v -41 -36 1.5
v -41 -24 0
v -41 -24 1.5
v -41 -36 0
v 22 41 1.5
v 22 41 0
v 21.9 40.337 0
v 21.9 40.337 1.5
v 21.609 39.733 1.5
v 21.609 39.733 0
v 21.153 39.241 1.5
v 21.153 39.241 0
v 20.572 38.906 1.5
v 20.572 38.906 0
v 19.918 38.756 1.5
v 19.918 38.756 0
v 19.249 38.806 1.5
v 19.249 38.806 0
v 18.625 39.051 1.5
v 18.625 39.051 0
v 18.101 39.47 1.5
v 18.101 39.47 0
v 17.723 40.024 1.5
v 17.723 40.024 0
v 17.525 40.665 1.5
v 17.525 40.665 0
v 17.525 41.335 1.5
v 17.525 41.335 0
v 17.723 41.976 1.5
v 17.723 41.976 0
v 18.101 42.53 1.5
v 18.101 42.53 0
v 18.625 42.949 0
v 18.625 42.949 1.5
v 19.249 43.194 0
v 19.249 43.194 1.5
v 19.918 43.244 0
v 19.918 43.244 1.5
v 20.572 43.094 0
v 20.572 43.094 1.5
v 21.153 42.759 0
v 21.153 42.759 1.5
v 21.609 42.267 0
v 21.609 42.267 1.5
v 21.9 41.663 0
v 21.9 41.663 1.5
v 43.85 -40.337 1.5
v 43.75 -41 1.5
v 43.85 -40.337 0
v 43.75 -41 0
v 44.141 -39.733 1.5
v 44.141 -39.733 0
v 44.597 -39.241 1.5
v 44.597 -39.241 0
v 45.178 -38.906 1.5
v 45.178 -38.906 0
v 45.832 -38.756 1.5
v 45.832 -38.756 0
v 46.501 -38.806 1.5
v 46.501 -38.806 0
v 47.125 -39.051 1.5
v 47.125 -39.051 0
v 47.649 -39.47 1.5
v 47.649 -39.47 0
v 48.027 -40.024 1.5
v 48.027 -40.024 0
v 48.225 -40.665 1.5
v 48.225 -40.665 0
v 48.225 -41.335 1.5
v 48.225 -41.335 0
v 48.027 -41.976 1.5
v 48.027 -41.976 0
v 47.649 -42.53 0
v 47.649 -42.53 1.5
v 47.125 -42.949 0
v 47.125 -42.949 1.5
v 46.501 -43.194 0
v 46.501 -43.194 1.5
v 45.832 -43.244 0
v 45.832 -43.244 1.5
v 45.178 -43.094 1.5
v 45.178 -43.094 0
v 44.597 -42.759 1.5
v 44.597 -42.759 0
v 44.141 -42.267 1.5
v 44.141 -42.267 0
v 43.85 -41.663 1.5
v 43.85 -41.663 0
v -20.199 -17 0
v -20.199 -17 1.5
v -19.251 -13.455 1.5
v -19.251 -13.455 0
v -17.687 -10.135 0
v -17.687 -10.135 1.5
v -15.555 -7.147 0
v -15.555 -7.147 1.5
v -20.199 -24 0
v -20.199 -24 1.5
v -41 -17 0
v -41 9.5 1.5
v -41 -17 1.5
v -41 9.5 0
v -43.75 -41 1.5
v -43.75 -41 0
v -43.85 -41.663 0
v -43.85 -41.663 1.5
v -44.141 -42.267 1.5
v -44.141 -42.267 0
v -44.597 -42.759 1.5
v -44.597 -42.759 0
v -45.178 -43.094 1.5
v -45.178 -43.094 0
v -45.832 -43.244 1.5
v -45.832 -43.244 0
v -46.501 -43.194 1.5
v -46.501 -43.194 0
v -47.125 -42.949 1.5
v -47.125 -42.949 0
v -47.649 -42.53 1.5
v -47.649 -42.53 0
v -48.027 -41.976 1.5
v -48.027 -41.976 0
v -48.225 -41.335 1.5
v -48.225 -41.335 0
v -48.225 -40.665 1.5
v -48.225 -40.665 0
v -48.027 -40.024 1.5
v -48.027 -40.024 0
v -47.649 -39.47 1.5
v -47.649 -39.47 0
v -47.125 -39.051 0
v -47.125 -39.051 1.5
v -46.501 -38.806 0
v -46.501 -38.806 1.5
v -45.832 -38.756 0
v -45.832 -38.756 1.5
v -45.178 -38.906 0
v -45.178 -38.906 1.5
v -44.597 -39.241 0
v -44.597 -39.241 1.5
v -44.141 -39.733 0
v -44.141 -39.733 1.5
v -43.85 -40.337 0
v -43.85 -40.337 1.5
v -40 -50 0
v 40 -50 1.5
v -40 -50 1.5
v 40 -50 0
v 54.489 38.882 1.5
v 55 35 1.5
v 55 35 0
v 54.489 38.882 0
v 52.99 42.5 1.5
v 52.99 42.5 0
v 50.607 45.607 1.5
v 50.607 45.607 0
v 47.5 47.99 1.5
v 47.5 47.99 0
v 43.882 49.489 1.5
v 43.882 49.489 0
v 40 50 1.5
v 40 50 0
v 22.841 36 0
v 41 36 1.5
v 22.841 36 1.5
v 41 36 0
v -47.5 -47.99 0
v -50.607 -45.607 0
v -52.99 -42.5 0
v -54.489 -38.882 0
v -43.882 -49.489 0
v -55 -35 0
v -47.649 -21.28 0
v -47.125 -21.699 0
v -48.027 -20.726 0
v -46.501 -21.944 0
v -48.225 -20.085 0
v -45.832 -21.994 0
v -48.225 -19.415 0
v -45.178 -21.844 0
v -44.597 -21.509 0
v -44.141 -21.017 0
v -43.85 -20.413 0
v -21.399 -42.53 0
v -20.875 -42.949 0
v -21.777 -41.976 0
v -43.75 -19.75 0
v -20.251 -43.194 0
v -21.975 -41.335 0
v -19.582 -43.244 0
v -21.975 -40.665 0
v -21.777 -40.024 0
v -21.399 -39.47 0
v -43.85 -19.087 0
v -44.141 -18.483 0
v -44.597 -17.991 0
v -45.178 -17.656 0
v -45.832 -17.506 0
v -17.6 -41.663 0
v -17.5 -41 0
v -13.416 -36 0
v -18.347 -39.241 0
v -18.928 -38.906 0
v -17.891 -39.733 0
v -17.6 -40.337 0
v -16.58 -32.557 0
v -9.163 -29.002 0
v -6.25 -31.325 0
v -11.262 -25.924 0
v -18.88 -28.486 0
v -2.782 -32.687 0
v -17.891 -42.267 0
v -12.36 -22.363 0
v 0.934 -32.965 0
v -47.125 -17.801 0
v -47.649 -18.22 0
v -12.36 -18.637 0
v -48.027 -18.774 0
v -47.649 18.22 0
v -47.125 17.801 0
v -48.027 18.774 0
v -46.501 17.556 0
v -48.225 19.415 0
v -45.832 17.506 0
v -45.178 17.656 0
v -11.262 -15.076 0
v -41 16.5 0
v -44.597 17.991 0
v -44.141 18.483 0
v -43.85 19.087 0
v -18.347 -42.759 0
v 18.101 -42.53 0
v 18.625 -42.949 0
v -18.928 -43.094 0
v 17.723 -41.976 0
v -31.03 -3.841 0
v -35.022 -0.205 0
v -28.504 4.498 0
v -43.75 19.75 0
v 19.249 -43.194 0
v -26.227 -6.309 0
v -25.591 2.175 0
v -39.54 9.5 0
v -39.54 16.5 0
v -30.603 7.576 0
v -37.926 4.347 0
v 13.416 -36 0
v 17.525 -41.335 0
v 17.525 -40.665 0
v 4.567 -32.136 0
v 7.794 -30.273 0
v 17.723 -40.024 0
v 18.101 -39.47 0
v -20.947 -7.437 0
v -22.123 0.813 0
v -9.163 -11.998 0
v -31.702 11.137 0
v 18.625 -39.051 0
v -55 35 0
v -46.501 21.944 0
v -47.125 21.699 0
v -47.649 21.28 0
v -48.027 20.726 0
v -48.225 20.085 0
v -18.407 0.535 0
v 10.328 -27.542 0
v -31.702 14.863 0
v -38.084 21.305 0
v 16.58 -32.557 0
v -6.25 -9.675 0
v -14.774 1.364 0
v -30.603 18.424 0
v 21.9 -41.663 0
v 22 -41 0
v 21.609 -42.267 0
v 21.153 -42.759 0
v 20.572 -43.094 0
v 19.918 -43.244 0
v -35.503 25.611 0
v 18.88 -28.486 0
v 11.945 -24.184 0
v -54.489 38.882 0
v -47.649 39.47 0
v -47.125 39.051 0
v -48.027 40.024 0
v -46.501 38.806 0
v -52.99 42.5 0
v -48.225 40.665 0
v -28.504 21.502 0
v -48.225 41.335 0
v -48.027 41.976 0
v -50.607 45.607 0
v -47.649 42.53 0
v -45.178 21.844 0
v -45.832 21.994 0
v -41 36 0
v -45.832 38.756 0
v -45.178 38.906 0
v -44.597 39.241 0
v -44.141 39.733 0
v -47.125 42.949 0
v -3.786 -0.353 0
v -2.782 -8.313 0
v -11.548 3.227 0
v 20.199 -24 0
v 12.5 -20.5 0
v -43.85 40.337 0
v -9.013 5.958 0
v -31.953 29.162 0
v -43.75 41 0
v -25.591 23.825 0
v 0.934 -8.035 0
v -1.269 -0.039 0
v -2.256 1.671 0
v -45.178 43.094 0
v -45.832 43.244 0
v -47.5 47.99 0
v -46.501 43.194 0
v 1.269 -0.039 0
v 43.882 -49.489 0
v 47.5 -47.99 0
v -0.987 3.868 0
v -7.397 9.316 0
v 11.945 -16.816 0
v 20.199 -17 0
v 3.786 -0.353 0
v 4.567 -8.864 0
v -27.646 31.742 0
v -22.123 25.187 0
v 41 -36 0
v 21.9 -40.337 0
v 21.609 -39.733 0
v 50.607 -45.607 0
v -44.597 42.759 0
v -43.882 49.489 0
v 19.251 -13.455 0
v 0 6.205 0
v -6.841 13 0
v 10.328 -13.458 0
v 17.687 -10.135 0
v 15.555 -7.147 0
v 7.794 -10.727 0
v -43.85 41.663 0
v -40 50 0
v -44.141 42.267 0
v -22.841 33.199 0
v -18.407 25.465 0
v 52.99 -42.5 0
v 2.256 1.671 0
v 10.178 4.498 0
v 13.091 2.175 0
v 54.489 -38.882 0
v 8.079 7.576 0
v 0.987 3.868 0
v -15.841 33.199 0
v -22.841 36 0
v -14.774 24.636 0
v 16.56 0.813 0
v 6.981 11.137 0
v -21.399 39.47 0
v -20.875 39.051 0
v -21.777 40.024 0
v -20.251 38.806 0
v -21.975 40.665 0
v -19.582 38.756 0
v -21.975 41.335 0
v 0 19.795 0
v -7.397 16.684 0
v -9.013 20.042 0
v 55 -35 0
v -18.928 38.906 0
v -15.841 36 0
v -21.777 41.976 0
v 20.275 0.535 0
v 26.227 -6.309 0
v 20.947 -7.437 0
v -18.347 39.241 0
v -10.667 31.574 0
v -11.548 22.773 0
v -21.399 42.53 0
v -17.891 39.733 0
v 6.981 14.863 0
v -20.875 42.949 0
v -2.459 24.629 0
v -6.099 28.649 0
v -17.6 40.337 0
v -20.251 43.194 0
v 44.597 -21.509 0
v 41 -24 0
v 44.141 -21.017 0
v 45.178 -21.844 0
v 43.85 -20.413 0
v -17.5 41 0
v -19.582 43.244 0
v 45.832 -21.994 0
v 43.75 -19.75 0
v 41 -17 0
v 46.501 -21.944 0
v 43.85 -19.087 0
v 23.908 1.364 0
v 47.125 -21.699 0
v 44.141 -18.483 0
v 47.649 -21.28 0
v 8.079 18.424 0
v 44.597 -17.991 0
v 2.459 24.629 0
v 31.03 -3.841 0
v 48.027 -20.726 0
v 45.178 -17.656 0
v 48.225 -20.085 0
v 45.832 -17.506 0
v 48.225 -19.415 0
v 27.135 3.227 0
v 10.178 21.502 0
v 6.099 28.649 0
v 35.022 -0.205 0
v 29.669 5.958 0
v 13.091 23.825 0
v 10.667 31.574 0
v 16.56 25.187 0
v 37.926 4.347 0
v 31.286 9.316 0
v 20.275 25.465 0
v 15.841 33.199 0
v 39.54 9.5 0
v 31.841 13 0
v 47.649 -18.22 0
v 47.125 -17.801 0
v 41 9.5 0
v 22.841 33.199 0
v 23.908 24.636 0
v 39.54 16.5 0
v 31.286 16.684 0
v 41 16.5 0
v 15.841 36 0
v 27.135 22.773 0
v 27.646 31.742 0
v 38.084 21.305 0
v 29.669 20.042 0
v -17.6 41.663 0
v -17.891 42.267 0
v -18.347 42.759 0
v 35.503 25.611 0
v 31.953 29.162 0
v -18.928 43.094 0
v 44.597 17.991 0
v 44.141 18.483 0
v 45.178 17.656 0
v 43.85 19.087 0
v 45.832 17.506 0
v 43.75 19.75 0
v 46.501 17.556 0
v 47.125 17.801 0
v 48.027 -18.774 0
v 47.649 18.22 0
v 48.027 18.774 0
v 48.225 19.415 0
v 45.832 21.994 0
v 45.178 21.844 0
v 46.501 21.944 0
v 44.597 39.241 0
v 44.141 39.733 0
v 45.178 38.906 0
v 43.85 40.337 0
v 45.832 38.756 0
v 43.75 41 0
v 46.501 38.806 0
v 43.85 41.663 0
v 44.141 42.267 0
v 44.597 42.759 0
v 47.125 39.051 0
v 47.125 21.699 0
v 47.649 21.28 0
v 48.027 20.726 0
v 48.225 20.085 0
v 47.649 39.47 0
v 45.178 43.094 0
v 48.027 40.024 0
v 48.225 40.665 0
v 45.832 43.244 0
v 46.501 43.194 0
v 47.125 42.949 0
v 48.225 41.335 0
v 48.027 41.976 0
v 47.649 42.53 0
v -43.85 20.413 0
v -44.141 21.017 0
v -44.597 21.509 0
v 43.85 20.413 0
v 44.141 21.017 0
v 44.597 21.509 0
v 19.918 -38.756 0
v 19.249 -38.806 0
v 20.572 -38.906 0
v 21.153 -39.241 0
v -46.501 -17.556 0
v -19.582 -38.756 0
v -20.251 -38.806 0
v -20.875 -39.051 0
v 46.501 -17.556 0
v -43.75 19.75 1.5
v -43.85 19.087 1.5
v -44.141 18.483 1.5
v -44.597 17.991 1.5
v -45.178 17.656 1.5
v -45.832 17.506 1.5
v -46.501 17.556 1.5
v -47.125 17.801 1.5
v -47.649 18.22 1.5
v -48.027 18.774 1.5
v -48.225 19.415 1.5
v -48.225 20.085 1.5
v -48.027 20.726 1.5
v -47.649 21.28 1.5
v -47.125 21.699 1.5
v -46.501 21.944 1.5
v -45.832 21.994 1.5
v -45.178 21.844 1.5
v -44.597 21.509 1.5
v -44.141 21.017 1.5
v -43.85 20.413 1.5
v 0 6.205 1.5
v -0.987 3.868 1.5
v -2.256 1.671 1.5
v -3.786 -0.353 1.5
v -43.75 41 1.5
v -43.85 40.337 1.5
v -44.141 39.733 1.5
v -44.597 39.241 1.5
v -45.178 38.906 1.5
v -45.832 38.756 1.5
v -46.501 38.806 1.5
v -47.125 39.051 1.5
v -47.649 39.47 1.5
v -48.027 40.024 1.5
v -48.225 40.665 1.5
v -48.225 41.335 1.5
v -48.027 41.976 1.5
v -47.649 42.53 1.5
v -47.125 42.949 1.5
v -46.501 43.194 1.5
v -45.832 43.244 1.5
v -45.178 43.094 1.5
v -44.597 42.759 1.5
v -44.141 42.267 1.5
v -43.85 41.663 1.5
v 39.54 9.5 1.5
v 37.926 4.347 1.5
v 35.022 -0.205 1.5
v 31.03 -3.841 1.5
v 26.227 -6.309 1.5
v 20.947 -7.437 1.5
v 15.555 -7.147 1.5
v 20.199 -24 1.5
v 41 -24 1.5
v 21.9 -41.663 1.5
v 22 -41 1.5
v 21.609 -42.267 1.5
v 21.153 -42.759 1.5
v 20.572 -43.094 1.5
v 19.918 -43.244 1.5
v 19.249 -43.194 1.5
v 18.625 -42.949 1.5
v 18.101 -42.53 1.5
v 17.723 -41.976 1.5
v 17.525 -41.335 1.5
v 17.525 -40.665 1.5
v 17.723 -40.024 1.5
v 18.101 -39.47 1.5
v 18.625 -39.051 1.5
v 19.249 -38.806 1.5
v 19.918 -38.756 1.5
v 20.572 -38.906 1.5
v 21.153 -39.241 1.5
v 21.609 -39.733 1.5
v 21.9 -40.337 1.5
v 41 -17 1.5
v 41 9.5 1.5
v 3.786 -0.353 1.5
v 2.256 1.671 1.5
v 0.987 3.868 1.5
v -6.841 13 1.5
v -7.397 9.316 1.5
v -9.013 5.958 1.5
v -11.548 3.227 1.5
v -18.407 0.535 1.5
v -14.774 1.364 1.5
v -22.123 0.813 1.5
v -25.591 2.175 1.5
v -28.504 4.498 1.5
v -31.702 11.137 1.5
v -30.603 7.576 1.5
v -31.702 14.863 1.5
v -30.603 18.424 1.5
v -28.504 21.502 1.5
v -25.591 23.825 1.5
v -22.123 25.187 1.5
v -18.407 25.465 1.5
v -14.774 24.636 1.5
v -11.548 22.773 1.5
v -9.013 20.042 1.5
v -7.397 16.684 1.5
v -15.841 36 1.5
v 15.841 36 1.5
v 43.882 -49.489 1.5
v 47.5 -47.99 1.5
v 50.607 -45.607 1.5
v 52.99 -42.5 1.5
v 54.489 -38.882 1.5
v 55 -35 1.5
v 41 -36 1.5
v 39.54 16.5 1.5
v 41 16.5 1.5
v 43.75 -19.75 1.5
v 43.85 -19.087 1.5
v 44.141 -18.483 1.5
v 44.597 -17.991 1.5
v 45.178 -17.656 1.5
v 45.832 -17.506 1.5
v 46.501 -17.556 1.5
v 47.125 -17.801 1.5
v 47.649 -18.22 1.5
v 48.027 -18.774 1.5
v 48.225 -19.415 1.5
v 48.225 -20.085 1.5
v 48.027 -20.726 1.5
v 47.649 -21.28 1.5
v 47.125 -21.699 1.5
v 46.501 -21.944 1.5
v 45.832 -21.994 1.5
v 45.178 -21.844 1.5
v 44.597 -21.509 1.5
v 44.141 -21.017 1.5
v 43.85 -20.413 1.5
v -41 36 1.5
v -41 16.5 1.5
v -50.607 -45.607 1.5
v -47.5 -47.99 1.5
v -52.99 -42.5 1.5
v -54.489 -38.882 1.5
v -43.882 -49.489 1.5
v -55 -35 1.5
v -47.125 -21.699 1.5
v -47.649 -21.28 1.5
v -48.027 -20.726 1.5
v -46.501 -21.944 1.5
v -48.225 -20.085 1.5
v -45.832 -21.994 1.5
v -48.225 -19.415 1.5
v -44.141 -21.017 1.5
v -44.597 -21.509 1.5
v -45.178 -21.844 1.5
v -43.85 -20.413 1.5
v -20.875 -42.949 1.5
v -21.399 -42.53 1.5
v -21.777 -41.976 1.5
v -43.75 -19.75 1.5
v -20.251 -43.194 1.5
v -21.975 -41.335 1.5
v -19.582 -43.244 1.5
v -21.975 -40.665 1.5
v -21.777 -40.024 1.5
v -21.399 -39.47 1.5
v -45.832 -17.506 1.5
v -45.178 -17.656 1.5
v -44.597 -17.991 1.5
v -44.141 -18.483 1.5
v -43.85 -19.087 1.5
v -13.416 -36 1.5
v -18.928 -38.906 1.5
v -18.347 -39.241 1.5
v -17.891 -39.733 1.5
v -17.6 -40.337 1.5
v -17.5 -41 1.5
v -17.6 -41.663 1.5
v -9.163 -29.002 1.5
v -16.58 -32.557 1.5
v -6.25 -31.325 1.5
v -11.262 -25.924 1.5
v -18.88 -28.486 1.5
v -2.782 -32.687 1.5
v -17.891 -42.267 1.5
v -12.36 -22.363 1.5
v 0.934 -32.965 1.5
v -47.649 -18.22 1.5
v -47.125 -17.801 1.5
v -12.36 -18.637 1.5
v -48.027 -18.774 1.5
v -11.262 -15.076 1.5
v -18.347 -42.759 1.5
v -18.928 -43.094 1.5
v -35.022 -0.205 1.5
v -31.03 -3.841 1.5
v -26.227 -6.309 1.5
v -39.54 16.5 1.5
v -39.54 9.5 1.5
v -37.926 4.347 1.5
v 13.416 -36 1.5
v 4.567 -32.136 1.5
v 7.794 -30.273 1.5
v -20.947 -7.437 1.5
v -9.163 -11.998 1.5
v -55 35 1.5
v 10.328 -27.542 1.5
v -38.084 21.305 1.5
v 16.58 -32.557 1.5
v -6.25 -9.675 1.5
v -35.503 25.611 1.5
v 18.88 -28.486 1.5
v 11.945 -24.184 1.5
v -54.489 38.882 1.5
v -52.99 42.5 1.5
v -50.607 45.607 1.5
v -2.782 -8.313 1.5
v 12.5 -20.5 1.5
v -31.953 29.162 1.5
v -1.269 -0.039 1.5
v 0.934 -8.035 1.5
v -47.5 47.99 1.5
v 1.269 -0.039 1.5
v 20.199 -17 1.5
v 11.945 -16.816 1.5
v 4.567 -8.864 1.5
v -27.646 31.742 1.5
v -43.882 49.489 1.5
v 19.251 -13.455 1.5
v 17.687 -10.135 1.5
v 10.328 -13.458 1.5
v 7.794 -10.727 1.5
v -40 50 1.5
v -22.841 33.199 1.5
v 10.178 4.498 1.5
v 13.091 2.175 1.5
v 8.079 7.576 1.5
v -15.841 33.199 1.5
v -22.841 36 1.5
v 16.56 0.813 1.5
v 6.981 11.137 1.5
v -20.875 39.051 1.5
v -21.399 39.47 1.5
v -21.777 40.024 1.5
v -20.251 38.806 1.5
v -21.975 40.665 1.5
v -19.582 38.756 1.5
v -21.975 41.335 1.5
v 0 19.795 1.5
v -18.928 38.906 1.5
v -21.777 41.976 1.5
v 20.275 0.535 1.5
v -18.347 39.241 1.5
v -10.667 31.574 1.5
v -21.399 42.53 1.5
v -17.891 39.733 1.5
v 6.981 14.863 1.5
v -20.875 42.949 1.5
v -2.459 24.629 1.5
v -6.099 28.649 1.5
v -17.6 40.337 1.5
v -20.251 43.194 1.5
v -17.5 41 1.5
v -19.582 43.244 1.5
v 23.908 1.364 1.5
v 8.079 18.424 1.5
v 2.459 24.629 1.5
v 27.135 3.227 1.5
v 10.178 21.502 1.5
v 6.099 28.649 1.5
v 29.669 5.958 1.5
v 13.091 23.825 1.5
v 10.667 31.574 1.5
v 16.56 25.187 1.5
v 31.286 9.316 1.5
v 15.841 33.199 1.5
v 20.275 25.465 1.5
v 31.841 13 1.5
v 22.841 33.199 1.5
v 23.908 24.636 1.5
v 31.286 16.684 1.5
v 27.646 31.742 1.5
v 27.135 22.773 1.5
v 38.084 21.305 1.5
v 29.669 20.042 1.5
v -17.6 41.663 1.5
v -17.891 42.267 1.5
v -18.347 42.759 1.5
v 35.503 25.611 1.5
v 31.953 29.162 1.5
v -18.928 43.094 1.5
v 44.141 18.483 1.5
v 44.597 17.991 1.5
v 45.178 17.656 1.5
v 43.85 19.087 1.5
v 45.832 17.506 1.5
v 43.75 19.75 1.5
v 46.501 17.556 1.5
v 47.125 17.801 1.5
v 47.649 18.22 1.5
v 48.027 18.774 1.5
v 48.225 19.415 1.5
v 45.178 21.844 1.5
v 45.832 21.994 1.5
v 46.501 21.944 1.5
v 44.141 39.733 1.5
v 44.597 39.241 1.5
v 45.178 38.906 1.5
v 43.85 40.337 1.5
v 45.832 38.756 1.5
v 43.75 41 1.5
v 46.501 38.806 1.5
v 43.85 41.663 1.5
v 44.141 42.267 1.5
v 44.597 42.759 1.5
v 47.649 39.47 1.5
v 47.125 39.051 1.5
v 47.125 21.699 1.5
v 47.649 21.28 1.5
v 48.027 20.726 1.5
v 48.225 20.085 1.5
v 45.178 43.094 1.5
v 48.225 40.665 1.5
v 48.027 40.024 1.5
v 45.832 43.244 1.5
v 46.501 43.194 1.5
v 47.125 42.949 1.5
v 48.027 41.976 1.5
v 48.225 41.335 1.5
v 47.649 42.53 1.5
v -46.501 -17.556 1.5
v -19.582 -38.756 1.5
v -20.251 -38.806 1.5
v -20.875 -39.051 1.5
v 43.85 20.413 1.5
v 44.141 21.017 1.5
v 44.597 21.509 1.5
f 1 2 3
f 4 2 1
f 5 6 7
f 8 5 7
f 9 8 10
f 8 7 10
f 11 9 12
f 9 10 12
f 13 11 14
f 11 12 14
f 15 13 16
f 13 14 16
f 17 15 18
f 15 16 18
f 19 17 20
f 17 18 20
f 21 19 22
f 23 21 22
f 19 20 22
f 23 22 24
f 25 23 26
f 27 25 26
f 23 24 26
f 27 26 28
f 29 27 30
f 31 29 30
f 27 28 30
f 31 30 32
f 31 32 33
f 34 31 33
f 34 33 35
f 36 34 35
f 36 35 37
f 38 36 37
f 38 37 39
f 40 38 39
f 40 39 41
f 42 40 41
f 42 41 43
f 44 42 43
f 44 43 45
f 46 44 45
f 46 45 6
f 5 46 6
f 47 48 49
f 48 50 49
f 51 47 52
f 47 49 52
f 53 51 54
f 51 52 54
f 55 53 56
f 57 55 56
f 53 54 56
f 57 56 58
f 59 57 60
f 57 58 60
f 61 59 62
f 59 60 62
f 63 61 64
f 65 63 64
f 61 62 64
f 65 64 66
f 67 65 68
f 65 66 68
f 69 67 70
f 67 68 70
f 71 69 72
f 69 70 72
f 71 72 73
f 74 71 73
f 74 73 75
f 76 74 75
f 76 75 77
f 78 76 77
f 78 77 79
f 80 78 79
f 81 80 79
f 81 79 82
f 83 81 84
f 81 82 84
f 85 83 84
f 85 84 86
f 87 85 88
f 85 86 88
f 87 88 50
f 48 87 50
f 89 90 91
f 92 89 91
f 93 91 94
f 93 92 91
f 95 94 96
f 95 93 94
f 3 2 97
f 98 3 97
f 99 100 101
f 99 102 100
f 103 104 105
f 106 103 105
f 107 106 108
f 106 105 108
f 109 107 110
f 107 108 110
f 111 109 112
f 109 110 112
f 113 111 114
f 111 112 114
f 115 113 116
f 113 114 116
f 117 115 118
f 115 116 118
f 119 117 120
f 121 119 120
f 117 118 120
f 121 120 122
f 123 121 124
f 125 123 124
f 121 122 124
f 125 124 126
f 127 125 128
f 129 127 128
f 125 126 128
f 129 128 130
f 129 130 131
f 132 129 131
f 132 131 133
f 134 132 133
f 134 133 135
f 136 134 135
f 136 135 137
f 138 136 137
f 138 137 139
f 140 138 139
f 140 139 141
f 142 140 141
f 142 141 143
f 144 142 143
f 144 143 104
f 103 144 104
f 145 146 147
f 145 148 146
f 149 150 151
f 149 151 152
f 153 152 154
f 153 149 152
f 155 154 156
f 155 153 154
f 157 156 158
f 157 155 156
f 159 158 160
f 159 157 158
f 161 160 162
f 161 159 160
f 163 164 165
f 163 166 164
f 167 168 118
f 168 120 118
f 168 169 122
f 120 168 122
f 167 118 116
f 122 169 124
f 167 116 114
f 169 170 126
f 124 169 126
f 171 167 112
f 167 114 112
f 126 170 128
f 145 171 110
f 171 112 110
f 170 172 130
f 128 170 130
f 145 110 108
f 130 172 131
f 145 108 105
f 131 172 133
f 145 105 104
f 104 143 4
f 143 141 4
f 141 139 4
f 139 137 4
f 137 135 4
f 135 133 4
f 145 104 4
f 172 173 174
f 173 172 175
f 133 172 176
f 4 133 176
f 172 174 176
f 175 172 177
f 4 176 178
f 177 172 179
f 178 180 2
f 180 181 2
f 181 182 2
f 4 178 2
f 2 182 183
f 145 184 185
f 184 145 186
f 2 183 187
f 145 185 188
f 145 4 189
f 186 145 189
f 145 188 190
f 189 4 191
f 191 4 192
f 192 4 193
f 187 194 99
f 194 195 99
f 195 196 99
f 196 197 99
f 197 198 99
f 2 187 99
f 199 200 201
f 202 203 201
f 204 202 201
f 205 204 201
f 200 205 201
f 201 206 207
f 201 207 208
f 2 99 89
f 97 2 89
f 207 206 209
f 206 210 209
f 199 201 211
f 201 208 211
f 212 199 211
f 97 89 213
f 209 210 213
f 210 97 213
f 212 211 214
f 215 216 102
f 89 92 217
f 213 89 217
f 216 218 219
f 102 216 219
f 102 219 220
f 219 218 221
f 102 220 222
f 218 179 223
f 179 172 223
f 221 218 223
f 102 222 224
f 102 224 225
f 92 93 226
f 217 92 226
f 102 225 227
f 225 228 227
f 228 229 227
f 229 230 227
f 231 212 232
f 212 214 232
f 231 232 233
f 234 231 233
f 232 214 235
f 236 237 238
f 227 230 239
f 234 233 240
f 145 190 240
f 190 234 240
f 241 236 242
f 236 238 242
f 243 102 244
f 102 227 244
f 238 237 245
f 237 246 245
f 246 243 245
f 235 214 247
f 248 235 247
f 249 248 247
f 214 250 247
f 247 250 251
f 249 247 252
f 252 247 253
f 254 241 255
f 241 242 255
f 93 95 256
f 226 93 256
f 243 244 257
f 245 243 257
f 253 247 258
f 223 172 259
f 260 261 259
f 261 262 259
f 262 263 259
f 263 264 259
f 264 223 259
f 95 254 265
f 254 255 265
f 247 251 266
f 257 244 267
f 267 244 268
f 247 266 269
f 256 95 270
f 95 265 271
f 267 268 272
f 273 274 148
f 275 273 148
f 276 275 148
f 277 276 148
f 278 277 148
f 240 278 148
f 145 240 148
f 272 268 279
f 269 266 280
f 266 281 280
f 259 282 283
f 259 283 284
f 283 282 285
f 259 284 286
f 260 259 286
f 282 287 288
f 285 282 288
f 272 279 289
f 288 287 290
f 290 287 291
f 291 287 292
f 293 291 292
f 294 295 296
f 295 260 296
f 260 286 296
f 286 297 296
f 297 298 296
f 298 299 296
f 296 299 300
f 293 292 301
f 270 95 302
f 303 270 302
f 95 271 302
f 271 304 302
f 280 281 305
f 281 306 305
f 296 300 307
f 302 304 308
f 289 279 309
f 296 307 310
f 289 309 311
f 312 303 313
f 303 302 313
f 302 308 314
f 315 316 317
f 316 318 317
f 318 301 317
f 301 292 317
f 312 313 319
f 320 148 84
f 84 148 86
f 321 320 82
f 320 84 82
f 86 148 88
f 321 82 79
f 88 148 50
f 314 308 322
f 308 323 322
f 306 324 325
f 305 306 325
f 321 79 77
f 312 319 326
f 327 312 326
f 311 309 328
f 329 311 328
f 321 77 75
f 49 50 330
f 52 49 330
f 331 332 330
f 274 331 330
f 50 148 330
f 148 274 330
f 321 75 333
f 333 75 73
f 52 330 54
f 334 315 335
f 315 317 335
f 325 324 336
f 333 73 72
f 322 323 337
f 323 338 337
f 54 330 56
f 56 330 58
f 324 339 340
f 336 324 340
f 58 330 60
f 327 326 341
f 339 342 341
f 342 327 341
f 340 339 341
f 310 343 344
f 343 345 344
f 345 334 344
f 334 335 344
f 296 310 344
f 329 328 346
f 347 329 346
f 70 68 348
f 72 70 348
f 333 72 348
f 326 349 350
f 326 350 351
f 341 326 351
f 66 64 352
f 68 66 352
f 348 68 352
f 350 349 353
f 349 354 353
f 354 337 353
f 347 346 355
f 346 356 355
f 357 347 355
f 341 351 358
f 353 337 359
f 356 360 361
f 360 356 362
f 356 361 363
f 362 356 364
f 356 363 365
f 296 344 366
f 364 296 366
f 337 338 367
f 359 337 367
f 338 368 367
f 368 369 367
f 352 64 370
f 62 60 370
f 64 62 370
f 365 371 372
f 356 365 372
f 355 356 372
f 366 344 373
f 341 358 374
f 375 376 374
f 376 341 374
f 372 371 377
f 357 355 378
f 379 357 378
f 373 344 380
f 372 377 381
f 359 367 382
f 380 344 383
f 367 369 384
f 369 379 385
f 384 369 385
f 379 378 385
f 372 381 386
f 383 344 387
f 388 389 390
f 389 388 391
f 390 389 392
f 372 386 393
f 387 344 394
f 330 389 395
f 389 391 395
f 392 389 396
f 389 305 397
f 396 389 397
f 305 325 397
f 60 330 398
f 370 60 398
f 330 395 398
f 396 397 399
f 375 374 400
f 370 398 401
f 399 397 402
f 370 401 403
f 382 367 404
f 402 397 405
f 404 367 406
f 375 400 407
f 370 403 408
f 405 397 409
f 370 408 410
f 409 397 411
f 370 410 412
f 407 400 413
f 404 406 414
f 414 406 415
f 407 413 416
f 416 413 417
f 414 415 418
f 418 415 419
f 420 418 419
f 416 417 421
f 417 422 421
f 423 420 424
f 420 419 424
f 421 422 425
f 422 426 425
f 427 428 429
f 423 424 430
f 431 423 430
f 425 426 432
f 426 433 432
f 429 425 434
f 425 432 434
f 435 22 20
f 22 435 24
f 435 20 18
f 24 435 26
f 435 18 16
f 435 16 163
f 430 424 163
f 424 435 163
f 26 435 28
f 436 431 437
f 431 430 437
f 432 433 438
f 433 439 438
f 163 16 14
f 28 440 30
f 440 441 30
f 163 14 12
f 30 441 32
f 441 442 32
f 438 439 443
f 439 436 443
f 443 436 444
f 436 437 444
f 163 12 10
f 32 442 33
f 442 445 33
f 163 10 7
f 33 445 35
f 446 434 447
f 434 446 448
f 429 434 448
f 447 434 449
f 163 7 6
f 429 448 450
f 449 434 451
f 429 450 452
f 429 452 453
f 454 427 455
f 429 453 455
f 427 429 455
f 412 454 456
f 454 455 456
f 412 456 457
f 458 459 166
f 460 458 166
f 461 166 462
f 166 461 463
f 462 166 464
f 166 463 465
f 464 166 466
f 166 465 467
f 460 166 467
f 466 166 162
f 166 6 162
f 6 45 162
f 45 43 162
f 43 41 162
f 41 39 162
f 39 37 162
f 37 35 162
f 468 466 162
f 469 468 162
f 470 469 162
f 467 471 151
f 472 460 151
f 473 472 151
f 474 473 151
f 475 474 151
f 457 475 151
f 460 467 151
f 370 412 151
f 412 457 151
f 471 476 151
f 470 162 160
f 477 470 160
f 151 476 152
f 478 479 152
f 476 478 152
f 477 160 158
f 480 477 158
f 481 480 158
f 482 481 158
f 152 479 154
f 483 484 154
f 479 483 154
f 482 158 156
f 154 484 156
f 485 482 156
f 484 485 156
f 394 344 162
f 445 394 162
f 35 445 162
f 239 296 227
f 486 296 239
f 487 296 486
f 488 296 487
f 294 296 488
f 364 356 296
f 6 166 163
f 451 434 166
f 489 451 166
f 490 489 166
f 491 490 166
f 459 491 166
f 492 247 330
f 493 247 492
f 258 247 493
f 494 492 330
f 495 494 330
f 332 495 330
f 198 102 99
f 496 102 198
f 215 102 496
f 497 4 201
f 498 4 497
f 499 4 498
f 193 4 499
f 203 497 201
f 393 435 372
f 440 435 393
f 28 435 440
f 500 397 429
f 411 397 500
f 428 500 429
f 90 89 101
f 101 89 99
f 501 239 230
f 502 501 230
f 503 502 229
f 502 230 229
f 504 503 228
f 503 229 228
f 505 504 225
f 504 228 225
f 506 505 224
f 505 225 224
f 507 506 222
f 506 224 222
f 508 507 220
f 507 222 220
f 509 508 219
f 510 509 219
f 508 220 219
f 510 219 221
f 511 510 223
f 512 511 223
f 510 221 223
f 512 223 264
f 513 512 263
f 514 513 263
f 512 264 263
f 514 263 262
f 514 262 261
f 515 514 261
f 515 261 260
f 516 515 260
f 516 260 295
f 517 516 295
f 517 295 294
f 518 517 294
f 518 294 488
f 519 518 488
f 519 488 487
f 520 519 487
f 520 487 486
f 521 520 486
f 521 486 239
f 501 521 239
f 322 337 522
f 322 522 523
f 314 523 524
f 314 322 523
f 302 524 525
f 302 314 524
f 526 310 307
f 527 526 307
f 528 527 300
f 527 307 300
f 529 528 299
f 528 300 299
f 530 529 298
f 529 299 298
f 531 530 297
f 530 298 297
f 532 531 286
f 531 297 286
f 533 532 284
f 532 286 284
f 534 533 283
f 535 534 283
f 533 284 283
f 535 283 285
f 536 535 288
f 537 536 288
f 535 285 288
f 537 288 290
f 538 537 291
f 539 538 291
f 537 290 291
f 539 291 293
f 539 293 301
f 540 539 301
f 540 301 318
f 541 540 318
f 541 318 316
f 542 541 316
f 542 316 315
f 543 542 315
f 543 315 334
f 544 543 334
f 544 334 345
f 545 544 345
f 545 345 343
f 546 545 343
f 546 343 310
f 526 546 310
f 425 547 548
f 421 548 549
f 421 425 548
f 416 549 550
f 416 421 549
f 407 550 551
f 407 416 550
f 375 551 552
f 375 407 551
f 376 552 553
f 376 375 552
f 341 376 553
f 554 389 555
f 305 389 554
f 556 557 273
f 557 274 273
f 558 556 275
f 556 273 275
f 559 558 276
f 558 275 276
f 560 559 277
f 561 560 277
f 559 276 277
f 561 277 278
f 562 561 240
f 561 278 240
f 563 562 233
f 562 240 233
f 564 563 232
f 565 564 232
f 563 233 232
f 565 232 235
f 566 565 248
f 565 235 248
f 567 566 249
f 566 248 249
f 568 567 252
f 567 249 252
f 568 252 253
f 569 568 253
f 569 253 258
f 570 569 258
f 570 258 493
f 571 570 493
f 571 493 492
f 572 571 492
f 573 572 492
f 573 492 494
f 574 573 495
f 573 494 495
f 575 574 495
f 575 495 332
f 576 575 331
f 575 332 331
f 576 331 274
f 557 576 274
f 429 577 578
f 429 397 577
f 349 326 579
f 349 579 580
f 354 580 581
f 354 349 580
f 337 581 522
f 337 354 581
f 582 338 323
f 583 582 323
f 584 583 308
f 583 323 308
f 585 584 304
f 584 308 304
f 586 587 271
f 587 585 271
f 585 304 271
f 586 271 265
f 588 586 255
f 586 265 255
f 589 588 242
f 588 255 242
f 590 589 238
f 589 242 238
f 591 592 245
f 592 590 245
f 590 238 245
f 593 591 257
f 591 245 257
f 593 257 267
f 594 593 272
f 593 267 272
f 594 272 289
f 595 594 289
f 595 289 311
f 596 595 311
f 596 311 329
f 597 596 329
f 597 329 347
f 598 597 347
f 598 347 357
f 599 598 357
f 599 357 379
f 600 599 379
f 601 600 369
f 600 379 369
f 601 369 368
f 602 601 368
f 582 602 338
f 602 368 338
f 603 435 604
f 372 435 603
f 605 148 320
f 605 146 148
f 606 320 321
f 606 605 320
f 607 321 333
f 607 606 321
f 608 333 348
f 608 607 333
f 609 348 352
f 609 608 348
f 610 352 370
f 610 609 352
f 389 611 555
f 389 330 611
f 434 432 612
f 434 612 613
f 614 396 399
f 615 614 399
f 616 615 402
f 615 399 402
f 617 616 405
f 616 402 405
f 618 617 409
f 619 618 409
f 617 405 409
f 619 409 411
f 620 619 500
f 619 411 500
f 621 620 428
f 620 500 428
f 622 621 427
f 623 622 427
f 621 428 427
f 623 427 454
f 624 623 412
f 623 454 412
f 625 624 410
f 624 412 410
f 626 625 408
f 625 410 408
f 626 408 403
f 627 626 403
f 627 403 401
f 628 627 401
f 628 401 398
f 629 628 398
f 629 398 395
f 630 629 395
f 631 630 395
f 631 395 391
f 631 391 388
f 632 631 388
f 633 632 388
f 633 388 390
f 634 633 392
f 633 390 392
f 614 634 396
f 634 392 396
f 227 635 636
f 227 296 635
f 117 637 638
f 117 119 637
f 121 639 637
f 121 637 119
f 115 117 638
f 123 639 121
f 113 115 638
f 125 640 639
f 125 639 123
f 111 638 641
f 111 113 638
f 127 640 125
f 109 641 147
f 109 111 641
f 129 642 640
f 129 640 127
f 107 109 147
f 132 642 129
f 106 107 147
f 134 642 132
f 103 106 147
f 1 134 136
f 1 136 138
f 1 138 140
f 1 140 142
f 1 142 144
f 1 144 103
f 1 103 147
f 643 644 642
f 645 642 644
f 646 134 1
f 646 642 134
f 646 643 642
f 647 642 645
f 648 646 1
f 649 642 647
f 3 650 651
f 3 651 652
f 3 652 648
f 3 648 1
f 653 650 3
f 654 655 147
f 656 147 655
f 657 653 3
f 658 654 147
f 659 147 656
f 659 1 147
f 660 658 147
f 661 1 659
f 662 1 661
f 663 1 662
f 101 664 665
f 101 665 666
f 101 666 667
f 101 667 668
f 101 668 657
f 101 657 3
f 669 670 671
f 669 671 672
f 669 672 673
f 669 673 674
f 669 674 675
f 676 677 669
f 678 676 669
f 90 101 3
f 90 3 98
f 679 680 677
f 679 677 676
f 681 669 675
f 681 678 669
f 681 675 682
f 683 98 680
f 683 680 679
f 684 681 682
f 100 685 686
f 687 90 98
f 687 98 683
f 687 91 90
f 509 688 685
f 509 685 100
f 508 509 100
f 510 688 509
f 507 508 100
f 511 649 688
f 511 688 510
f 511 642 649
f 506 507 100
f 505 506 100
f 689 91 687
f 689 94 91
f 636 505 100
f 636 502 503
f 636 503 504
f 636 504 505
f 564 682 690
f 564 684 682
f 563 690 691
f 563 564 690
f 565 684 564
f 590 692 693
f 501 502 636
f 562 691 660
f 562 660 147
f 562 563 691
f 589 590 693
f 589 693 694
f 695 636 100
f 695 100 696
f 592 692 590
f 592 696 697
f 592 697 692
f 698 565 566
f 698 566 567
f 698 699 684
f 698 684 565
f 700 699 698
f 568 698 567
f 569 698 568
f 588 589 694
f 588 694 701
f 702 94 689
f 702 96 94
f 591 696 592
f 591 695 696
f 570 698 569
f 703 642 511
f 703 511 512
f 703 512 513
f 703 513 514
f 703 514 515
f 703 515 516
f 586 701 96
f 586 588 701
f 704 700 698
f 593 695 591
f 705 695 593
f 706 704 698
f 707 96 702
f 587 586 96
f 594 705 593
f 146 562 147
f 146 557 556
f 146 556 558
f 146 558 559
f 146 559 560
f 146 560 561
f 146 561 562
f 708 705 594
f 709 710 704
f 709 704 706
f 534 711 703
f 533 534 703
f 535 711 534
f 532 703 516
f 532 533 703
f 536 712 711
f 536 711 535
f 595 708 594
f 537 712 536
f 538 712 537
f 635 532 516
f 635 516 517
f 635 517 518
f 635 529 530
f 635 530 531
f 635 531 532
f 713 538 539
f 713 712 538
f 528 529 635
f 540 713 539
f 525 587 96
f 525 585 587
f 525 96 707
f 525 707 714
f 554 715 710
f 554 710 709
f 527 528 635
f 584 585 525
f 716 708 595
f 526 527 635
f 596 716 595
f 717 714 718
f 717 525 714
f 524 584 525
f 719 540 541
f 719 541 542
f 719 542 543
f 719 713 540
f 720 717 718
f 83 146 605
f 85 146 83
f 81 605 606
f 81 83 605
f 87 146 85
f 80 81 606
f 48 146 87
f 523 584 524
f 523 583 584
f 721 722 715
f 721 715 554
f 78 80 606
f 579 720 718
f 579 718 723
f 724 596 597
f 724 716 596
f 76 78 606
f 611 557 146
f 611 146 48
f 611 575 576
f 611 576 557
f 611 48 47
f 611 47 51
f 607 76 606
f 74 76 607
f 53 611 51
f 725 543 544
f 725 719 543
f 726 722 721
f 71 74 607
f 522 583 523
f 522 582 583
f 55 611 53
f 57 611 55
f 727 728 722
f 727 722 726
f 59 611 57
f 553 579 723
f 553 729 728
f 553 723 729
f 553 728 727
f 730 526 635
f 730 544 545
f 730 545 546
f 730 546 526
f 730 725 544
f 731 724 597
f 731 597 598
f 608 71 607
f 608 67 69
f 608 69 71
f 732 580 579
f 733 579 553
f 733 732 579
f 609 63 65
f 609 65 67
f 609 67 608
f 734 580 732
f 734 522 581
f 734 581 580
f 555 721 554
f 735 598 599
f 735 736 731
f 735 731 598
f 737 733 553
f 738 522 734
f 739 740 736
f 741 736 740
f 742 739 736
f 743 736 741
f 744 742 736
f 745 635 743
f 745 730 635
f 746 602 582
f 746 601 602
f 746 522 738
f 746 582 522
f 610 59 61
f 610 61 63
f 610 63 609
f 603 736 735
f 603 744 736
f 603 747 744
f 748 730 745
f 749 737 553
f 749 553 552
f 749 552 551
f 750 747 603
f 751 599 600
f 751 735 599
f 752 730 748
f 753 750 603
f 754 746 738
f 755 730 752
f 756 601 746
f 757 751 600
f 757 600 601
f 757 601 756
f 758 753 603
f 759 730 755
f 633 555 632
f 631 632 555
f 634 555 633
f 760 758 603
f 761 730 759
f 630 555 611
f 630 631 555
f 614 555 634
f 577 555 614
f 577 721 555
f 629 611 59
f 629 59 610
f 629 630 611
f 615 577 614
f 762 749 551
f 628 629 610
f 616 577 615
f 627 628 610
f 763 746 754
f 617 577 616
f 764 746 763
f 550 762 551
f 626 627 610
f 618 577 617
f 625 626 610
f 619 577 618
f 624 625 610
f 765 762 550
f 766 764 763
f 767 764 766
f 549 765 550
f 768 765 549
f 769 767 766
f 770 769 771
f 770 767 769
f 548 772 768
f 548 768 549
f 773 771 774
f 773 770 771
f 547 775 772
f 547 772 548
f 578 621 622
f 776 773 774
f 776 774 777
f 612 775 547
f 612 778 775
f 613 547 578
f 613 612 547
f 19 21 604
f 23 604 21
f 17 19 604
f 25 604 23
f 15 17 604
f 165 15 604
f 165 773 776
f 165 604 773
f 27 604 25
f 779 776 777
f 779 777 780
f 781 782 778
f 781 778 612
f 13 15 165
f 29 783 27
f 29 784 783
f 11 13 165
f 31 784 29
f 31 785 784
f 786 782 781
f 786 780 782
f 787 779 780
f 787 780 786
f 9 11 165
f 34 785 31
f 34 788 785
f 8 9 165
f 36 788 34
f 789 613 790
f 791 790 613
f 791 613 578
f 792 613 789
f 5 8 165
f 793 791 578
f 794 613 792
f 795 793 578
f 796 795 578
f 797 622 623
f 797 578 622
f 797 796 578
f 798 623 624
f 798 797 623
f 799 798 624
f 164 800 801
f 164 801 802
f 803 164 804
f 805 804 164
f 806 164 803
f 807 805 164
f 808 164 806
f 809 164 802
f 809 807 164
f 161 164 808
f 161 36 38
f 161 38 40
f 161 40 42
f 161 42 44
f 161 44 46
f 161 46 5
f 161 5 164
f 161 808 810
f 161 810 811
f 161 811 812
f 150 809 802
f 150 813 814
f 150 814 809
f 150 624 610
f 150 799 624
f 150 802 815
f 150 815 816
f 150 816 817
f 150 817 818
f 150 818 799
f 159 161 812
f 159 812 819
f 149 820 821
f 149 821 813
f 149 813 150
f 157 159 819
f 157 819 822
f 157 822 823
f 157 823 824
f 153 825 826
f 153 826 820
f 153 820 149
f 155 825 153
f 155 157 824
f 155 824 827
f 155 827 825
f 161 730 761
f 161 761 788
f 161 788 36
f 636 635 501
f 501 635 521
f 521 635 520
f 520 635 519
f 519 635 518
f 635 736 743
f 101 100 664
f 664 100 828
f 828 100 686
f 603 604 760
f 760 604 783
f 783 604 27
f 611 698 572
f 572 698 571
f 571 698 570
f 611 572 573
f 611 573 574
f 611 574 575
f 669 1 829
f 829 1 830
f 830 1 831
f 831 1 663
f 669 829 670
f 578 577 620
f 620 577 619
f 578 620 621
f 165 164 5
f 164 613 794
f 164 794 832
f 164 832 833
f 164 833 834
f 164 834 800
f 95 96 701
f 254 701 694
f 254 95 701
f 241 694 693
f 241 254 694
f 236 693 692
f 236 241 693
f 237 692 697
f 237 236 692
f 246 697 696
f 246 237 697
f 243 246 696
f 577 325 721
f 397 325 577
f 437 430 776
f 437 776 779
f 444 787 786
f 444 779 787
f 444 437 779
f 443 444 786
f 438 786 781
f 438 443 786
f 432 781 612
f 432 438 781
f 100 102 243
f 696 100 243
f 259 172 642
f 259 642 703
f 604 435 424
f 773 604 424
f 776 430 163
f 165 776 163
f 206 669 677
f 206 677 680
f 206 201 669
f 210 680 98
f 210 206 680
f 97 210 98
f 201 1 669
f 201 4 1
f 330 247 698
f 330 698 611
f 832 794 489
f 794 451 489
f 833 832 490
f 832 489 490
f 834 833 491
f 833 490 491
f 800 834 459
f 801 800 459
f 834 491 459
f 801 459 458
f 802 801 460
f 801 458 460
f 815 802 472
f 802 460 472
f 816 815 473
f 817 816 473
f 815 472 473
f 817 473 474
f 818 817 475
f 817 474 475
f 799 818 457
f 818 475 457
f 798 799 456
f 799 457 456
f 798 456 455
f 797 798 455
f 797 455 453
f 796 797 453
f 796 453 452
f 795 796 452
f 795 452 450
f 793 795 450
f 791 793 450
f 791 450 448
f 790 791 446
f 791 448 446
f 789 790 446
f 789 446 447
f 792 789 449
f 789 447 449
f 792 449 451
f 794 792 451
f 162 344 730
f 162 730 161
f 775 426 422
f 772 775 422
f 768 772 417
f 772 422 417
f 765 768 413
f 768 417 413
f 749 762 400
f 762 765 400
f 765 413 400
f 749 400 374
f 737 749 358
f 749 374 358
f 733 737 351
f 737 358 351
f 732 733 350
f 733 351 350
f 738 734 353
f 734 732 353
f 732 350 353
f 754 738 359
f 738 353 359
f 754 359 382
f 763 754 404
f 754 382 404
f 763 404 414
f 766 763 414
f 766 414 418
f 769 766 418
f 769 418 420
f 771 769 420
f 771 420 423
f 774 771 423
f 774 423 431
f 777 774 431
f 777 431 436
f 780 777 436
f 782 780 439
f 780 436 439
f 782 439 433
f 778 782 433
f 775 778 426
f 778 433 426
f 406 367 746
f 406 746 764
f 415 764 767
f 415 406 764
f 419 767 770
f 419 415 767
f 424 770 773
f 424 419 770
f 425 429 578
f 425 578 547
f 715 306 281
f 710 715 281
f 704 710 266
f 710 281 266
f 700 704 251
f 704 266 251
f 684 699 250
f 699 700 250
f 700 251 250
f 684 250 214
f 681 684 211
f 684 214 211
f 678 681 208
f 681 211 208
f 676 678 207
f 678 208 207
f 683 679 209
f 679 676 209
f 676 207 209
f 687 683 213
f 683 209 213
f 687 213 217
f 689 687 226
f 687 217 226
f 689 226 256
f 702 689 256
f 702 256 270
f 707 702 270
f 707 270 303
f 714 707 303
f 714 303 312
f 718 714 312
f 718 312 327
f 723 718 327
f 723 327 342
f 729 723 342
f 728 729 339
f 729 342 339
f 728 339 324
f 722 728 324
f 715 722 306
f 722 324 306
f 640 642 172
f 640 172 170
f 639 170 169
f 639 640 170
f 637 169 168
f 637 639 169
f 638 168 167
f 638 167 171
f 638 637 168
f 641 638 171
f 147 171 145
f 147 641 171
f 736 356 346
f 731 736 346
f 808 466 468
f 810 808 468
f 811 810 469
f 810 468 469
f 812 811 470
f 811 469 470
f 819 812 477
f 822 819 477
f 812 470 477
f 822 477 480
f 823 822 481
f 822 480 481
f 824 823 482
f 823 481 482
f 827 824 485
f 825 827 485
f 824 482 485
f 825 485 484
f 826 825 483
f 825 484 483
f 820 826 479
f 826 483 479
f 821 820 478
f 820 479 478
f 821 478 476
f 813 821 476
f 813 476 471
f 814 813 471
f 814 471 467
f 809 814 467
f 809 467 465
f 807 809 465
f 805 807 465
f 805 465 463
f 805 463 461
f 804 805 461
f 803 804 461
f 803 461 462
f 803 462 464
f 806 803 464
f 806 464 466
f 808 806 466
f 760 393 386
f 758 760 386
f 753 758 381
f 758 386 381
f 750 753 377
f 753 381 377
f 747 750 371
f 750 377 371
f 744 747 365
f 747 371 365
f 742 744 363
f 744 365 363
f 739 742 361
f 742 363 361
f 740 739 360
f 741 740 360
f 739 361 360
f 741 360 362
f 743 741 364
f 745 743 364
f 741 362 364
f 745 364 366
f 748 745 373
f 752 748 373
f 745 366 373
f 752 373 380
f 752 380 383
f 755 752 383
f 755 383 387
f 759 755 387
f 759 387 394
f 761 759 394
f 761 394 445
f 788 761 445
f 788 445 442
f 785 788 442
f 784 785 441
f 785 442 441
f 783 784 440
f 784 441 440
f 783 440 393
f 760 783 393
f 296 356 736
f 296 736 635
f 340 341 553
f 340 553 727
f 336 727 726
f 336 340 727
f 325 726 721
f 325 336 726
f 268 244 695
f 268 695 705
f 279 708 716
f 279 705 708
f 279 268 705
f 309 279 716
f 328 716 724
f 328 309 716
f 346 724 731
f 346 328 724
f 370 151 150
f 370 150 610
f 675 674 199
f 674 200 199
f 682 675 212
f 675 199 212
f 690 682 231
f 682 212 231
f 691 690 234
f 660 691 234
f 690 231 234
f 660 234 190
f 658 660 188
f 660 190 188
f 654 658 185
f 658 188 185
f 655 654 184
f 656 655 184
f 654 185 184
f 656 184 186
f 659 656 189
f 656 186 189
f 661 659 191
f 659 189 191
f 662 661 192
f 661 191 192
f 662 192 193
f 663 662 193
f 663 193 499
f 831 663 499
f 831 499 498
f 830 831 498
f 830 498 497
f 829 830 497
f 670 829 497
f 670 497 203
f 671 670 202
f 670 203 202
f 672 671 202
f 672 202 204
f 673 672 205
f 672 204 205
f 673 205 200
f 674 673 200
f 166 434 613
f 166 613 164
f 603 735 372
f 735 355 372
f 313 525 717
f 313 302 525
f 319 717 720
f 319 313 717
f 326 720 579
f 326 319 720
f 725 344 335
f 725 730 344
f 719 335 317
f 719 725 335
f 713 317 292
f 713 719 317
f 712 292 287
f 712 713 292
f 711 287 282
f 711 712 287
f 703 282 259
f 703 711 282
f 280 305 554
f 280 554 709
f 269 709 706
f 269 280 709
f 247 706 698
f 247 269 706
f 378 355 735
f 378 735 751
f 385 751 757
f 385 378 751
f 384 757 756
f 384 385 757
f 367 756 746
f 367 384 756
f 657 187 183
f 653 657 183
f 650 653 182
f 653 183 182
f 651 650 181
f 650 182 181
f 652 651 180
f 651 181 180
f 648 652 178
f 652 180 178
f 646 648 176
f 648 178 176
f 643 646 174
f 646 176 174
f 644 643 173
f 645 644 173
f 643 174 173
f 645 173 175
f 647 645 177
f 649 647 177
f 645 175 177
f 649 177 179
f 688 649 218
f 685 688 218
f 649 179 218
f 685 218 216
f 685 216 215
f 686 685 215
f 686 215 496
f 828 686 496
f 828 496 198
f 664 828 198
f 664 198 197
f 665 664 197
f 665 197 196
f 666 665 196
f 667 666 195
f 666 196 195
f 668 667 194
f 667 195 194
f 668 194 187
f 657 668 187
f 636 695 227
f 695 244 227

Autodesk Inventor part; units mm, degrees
ref_plane "YZ Plane" through (0, 0, 0) normal (1, 0, 0) x (0, 1, 0)
ref_plane "XZ Plane" through (0, 0, 0) normal (0, 1, 0) x (-1, 0, 0)
ref_plane "XY Plane" through (0, 0, 0) normal (0, 0, 1) x (1, 0, 0)
sketch "Sketch1" plane through (0, 0, 0) normal (0, 0, 1) x (1, 0, 0)
  line L0 (-55, 50) -> (55, 50)
  line L1 (55, 50) -> (55, -50)
  line L2 (55, -50) -> (-55, -50)
  line L3 (-55, -50) -> (-55, 50)
  line L4 (41, 36) -> (-41, 36)
  line L5 (-41, 36) -> (-41, -36)
  line L6 (-41, -36) -> (41, -36)
  line L7 (41, -36) -> (41, 36)
  line L8 (0, 152.7233) -> (0, -72.1628) construction
  line L9 (-77.8847, 0) -> (88.8171, 0) construction
  line L10 (-55, 41) -> (55, 41) construction
  circle A0 centre (0, 41) radius 2.25
  circle A1 centre (-19.75, 41) radius 2.25
  circle A2 centre (19.75, 41) radius 2.25
  line L11 (-46, 50) -> (-46, -50) construction
  circle A3 centre (-46, 41) radius 2.25
  circle A4 centre (-46, 0) radius 2.25
  line L12 (-55, -41) -> (55, -41) construction
  circle A5 centre (-46, -41) radius 2.25
  circle A6 centre (-46, 19.75) radius 2.25
  circle A7 centre (-46, -19.75) radius 2.25
  line L13 (0, -20.5) -> (-19.3412, 13) construction
  line L14 (-19.3412, 13) -> (19.3412, 13) construction
  line L15 (19.3412, 13) -> (0, -20.5) construction
  circle A8 centre (19.3412, 13) radius 12.5
  circle A9 centre (-19.3412, 13) radius 12.5
  circle A10 centre (0, -20.5) radius 12.5
  circle A11 centre (-19.3412, 13) radius 20.5
  circle A12 centre (19.3412, 13) radius 20.5
  circle A13 centre (0, -20.5) radius 20.5
  line L16 (-22.8412, 30.0471) -> (-15.8412, 30.0471)
  line L17 (-15.8412, 30.0471) -> (-15.8412, 36)
  line L18 (-15.8412, 36) -> (-22.8412, 36)
  line L19 (-22.8412, 36) -> (-22.8412, 30.0471)
  line L20 (15.8412, 30.0471) -> (22.8412, 30.0471)
  line L21 (22.8412, 30.0471) -> (22.8412, 36)
  line L22 (22.8412, 36) -> (15.8412, 36)
  line L23 (15.8412, 36) -> (15.8412, 30.0471)
  line L24 (-35.3273, 16.5) -> (-41, 16.5)
  line L25 (-41, 16.5) -> (-41, 9.5)
  line L26 (-41, 9.5) -> (-35.3273, 9.5)
  line L27 (-35.3273, 9.5) -> (-35.3273, 16.5)
  line L28 (34.9738, 16.5) -> (41, 16.5)
  line L29 (41, 16.5) -> (41, 9.5)
  line L30 (41, 9.5) -> (34.9738, 9.5)
  line L31 (34.9738, 9.5) -> (34.9738, 16.5)
  line L32 (-3.5, -36.2367) -> (3.5, -36.2367)
  line L33 (3.5, -36.2367) -> (3.5, -36)
  line L34 (3.5, -36) -> (-3.5, -36)
  line L35 (-3.5, -36) -> (-3.5, -36.2367)
  line L36 (-16.3125, -17) -> (-41, -17)
  line L37 (-41, -17) -> (-41, -24)
  line L38 (-41, -24) -> (-16.3125, -24)
  line L39 (-16.3125, -24) -> (-16.3125, -17)
  line L40 (16.0929, -17) -> (41, -17)
  line L41 (41, -17) -> (41, -24)
  line L42 (41, -24) -> (16.0929, -24)
  line L43 (16.0929, -24) -> (16.0929, -17)
  point P0 (0, 0)
  point P1 (0, 50)
  point P2 (55, 0)
  point P3 (0, 1.8333)
  point P4 (-16.3125, -20.5)
  point P5 (16.0929, -20.5)
  point P6 (34.9738, 13)
  point P7 (-35.3273, 13)
  point P8 (-19.3412, 30.0471)
  point P9 (19.3412, 30.0471)
  point P10 (0, -36.2367)
  dimension "d0" = 110
  dimension "d1" = 100
  dimension "d2" = 14
  dimension "d5" = 9
  dimension "d6" = 4.5
  dimension "d7" = 4.5
  dimension "d8" = 4.5
  dimension "d9" = 22
  dimension "d10" = 22
  dimension "d11" = 9
  dimension "d12" = 4.5
  dimension "d13" = 4.5
  dimension "d14" = 9
  dimension "d15" = 4.5
  dimension "d31" = 4.5
  dimension "d32" = 4.5
  dimension "d33" = 22
  dimension "d34" = 22
  dimension "d53" = 23
  dimension "d54" = 25
  dimension "d55" = 25
  dimension "d56" = 25
  dimension "d65" = 8
  dimension "d66" = 8
  dimension "d67" = 8
  dimension "d68" = 7
  dimension "d69" = 7
  dimension "d70" = 7
  dimension "d71" = 7
  dimension "d72" = 7
  dimension "d73" = 7
  dimension "d74" = 7
  dimension "d75" = 38.6825
extrude "Extrusion1" add sketch "Sketch1" along normal blind 1.5 contours L0 L1 L2 L3 | L21 A12 L23 L4 | L7 L30 A12 L28 | L21 L20 L23 A12 | A12 L28 L31 L30 A13 A11 L23 L20 L21 | A12 L30 L31 L28 | L17 A11 L19 L4 | L7 L42 A13 L40 | L17 L16 L19 A11 | A11 A12 A13 L26 L27 L24 L19 L16 L17 | A11 A12 | L40 L43 L42 A13 L6 L38 L39 L36 A11 A12 | A13 L42 L43 L40 | A12 A13 | L24 A11 L26 L5 | L24 L27 L26 A11 | A11 A13 | A13 L6 L35 L32 L33 | L33 L32 L35 L6 | L36 A13 L38 L5 | L36 L39 L38 A13 | A0 | A1 | A2 | A3 | A4 | A5 | A6 | A7
extrude "Extrusion2" cut sketch "Sketch1" along normal blind 10 contours A1 | A2
mirror "Mirror1" about plane through (0, 0, 0) normal (0, 1, 0) of "Extrusion2"
extrude "Extrusion3" cut sketch "Sketch1" along normal blind 10 contours A3 | A5 | A6 | A7
mirror "Mirror2" about plane through (0, 0, 0) normal (1, 0, 0) of "Extrusion3"
extrude "Extrusion7" cut sketch "Sketch1" along normal blind 10 contours L7 L28 A12 L21 L4 | L23 A12 A11 L17 L4 | L7 L40 A13 A12 L30 | L19 A11 L24 L5 L4 | L7 L6 A13 L42 | L40 L43 L42 A13 L6 L38 L39 L36 A11 A12 | A12 A13 A11 | L26 A11 A13 L36 L5 | L6 L5 L38 A13
extrude "Extrusion8" add sketch "Sketch1" along normal blind 1.5 contours L40 L43 L42 A13 L6 L38 L39 L36 A11 A12 | A13 L42 L43 L40 | A12 A13 | A11 A13 | A13 L6 L35 L32 L33 | L36 L39 L38 A13
fillet "Fillet1" radius 15 4 edges at (-55, -50, 0.75) (55, -50, 0.75) (55, 50, 0.75) (-55, 50, 0.75)
properties part number "Base"
